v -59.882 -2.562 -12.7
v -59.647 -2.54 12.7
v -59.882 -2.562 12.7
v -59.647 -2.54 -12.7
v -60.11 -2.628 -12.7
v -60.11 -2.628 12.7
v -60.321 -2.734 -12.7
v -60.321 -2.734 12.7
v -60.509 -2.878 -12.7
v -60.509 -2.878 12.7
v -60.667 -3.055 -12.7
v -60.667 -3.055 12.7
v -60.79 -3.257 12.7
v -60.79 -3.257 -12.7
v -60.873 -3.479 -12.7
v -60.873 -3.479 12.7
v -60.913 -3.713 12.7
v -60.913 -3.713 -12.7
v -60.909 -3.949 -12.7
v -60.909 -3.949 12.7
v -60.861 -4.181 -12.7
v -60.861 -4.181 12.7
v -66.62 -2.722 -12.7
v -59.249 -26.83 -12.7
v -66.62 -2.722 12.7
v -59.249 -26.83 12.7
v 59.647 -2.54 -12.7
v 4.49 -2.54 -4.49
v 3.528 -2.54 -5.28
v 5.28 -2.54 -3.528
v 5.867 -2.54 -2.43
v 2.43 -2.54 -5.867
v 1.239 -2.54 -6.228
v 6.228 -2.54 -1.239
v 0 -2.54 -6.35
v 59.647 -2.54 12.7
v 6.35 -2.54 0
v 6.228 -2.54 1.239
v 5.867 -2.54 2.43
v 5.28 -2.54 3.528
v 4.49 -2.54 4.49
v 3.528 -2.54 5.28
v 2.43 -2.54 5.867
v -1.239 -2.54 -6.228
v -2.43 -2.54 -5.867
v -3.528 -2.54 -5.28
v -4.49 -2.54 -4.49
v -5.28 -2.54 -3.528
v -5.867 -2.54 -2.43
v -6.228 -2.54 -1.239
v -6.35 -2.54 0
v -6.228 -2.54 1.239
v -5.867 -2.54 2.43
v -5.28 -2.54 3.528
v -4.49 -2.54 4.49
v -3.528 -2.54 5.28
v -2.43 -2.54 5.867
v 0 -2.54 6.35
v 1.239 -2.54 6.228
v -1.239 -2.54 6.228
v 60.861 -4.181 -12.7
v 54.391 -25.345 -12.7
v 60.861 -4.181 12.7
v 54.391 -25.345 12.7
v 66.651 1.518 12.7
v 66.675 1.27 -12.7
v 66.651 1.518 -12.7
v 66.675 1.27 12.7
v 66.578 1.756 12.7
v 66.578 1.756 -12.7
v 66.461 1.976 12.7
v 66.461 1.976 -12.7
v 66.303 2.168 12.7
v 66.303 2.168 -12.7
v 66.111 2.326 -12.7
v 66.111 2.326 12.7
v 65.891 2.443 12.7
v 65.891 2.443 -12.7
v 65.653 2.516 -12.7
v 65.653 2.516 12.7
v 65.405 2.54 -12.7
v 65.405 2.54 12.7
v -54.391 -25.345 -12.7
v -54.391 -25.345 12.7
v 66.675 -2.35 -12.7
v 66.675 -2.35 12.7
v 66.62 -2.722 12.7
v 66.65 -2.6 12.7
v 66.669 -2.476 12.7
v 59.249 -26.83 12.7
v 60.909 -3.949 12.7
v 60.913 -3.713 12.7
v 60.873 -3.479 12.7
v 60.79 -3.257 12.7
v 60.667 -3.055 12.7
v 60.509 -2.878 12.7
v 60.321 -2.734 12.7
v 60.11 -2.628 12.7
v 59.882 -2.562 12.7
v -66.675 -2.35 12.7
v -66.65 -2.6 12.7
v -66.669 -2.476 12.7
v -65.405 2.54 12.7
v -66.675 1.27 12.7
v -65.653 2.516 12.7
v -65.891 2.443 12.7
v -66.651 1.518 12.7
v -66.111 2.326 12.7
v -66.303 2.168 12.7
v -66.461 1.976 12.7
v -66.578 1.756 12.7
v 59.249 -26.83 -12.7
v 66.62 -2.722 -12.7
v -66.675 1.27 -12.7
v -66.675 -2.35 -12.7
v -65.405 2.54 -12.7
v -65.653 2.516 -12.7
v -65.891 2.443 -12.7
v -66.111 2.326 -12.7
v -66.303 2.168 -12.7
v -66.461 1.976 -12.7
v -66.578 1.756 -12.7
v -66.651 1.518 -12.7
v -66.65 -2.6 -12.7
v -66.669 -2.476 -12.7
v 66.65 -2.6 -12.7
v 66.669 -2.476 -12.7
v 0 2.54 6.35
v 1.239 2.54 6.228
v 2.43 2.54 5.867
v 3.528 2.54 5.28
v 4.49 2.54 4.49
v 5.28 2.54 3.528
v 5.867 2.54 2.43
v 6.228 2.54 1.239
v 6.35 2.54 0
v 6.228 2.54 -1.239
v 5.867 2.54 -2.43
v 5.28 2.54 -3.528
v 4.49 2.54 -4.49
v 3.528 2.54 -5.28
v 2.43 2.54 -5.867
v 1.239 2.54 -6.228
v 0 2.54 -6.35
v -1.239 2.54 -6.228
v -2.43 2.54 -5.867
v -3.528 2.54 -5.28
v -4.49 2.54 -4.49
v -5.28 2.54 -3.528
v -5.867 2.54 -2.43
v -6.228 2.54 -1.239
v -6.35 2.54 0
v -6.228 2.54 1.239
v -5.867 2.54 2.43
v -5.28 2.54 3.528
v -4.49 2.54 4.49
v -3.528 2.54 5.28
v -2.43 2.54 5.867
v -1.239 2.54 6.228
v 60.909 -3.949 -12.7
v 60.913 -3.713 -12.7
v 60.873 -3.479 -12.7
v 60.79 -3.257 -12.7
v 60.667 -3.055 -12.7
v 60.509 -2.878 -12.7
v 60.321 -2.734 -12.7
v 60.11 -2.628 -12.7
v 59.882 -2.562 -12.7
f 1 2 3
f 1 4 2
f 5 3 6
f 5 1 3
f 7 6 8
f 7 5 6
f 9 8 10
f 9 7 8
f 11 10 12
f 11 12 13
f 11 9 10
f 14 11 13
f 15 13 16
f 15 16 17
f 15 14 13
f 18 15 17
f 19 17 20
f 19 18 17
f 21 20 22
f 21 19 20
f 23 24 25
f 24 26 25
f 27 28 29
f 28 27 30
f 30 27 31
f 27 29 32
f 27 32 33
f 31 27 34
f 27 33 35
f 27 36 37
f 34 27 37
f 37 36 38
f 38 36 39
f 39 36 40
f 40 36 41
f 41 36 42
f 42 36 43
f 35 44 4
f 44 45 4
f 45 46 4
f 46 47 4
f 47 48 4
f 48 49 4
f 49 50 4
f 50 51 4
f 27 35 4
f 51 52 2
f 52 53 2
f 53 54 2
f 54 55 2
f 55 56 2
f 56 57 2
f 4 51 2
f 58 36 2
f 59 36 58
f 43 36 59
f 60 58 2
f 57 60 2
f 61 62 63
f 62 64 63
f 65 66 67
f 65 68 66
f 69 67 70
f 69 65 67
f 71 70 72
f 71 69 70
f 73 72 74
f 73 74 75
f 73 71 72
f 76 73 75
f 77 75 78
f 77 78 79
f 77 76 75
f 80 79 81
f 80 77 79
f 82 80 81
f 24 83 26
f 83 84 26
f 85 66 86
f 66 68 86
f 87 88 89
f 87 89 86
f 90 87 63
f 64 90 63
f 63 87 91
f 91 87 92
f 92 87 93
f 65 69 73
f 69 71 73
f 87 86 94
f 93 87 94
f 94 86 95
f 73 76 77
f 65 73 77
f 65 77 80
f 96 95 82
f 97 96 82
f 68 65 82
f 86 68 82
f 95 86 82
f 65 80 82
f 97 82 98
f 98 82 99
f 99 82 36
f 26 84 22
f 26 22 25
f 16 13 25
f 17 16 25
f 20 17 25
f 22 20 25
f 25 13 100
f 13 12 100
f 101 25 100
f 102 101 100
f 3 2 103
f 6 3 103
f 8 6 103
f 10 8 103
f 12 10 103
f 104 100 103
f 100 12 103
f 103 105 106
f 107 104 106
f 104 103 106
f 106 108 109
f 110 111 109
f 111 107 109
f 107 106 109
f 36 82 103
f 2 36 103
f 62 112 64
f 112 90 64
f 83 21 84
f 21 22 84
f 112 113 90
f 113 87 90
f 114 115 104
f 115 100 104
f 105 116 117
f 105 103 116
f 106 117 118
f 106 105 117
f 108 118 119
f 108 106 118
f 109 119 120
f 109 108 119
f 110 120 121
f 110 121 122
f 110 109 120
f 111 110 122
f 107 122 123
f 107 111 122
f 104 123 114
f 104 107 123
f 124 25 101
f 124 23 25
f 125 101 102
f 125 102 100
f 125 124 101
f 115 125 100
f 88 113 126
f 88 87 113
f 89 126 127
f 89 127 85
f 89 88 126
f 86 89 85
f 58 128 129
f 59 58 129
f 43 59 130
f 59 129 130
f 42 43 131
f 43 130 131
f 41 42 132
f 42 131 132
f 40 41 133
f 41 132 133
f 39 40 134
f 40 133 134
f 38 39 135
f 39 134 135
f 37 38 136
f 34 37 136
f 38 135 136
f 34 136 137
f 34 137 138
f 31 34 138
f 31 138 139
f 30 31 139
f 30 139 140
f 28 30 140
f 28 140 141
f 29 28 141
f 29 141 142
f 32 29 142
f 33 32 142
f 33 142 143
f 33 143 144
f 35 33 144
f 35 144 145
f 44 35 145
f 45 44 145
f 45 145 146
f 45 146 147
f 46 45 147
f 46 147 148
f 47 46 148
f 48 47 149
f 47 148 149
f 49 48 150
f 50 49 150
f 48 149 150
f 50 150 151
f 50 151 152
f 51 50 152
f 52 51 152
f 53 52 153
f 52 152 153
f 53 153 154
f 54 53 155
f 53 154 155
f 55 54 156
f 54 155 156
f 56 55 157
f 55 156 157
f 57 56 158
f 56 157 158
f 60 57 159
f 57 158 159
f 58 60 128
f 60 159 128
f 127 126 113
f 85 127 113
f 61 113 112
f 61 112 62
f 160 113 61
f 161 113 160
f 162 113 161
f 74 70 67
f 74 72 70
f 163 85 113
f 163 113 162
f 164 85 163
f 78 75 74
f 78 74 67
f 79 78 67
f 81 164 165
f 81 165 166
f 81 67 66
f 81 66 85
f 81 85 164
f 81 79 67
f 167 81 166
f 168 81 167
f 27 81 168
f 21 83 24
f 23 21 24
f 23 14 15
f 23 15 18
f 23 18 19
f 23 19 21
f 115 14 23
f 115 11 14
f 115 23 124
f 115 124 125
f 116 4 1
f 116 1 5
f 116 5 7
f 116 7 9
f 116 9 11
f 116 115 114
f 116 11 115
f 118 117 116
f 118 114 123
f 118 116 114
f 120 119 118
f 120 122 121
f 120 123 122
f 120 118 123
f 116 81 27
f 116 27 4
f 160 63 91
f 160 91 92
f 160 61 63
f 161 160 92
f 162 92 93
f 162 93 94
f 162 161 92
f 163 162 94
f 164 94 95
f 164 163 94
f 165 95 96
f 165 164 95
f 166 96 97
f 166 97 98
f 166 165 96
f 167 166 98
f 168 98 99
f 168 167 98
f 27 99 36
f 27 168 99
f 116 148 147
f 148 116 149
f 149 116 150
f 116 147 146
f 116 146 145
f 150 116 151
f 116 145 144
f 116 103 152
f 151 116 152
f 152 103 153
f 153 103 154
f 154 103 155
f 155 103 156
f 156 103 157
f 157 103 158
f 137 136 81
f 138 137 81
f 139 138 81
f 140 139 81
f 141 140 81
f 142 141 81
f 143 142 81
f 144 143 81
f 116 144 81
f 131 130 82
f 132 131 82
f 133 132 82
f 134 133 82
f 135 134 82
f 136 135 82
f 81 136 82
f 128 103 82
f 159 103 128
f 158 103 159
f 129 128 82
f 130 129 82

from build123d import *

# Parameters (mm, degrees)
BOSS_EXTRUDE1_DEPTH = 12.7
SKETCH3_R           = 6.35
CUT_EXTRUDE1_DEPTH  = 74.955735381
FILLET1_R           = 1.27


with BuildPart() as part:
    # Sketch2 → Boss-Extrude1 (new, symmetric)
    with BuildSketch(Plane.XY):
        Polygon((66.675, -2.54), (59.2487587, -26.830140801), (54.39073054, -25.344892541), (61.362885877, -2.54), (-61.362885877, -2.54), (-54.39073054, -25.344892541), (-59.2487587, -26.830140801), (-66.675, -2.54), (-66.675, 2.54), (66.675, 2.54), align=None)
    extrude(amount=BOSS_EXTRUDE1_DEPTH, both=True)

    # Sketch3 → Cut-Extrude1 (cut, through all)
    with BuildSketch(Plane(origin=(0, 2.54, 0), x_dir=(1, 0, 0), z_dir=(0, 1, 0))):
        with Locations(Location((0, 0, 0), (0, 0, 270))):
            Circle(SKETCH3_R)
    extrude(amount=-CUT_EXTRUDE1_DEPTH, mode=Mode.SUBTRACT)

    # Fillet1
    fillet1_edges = [part.edges().sort_by_distance(p)[0] for p in [
        (66.675, -2.54, 0),
        (61.362885877, -2.54, 0),
        (-61.362885877, -2.54, 0),
        (-66.675, -2.54, 0),
        (-66.675, 2.54, 0),
        (66.675, 2.54, 0),
    ]]
    fillet(fillet1_edges, radius=FILLET1_R)


solid = part.part
